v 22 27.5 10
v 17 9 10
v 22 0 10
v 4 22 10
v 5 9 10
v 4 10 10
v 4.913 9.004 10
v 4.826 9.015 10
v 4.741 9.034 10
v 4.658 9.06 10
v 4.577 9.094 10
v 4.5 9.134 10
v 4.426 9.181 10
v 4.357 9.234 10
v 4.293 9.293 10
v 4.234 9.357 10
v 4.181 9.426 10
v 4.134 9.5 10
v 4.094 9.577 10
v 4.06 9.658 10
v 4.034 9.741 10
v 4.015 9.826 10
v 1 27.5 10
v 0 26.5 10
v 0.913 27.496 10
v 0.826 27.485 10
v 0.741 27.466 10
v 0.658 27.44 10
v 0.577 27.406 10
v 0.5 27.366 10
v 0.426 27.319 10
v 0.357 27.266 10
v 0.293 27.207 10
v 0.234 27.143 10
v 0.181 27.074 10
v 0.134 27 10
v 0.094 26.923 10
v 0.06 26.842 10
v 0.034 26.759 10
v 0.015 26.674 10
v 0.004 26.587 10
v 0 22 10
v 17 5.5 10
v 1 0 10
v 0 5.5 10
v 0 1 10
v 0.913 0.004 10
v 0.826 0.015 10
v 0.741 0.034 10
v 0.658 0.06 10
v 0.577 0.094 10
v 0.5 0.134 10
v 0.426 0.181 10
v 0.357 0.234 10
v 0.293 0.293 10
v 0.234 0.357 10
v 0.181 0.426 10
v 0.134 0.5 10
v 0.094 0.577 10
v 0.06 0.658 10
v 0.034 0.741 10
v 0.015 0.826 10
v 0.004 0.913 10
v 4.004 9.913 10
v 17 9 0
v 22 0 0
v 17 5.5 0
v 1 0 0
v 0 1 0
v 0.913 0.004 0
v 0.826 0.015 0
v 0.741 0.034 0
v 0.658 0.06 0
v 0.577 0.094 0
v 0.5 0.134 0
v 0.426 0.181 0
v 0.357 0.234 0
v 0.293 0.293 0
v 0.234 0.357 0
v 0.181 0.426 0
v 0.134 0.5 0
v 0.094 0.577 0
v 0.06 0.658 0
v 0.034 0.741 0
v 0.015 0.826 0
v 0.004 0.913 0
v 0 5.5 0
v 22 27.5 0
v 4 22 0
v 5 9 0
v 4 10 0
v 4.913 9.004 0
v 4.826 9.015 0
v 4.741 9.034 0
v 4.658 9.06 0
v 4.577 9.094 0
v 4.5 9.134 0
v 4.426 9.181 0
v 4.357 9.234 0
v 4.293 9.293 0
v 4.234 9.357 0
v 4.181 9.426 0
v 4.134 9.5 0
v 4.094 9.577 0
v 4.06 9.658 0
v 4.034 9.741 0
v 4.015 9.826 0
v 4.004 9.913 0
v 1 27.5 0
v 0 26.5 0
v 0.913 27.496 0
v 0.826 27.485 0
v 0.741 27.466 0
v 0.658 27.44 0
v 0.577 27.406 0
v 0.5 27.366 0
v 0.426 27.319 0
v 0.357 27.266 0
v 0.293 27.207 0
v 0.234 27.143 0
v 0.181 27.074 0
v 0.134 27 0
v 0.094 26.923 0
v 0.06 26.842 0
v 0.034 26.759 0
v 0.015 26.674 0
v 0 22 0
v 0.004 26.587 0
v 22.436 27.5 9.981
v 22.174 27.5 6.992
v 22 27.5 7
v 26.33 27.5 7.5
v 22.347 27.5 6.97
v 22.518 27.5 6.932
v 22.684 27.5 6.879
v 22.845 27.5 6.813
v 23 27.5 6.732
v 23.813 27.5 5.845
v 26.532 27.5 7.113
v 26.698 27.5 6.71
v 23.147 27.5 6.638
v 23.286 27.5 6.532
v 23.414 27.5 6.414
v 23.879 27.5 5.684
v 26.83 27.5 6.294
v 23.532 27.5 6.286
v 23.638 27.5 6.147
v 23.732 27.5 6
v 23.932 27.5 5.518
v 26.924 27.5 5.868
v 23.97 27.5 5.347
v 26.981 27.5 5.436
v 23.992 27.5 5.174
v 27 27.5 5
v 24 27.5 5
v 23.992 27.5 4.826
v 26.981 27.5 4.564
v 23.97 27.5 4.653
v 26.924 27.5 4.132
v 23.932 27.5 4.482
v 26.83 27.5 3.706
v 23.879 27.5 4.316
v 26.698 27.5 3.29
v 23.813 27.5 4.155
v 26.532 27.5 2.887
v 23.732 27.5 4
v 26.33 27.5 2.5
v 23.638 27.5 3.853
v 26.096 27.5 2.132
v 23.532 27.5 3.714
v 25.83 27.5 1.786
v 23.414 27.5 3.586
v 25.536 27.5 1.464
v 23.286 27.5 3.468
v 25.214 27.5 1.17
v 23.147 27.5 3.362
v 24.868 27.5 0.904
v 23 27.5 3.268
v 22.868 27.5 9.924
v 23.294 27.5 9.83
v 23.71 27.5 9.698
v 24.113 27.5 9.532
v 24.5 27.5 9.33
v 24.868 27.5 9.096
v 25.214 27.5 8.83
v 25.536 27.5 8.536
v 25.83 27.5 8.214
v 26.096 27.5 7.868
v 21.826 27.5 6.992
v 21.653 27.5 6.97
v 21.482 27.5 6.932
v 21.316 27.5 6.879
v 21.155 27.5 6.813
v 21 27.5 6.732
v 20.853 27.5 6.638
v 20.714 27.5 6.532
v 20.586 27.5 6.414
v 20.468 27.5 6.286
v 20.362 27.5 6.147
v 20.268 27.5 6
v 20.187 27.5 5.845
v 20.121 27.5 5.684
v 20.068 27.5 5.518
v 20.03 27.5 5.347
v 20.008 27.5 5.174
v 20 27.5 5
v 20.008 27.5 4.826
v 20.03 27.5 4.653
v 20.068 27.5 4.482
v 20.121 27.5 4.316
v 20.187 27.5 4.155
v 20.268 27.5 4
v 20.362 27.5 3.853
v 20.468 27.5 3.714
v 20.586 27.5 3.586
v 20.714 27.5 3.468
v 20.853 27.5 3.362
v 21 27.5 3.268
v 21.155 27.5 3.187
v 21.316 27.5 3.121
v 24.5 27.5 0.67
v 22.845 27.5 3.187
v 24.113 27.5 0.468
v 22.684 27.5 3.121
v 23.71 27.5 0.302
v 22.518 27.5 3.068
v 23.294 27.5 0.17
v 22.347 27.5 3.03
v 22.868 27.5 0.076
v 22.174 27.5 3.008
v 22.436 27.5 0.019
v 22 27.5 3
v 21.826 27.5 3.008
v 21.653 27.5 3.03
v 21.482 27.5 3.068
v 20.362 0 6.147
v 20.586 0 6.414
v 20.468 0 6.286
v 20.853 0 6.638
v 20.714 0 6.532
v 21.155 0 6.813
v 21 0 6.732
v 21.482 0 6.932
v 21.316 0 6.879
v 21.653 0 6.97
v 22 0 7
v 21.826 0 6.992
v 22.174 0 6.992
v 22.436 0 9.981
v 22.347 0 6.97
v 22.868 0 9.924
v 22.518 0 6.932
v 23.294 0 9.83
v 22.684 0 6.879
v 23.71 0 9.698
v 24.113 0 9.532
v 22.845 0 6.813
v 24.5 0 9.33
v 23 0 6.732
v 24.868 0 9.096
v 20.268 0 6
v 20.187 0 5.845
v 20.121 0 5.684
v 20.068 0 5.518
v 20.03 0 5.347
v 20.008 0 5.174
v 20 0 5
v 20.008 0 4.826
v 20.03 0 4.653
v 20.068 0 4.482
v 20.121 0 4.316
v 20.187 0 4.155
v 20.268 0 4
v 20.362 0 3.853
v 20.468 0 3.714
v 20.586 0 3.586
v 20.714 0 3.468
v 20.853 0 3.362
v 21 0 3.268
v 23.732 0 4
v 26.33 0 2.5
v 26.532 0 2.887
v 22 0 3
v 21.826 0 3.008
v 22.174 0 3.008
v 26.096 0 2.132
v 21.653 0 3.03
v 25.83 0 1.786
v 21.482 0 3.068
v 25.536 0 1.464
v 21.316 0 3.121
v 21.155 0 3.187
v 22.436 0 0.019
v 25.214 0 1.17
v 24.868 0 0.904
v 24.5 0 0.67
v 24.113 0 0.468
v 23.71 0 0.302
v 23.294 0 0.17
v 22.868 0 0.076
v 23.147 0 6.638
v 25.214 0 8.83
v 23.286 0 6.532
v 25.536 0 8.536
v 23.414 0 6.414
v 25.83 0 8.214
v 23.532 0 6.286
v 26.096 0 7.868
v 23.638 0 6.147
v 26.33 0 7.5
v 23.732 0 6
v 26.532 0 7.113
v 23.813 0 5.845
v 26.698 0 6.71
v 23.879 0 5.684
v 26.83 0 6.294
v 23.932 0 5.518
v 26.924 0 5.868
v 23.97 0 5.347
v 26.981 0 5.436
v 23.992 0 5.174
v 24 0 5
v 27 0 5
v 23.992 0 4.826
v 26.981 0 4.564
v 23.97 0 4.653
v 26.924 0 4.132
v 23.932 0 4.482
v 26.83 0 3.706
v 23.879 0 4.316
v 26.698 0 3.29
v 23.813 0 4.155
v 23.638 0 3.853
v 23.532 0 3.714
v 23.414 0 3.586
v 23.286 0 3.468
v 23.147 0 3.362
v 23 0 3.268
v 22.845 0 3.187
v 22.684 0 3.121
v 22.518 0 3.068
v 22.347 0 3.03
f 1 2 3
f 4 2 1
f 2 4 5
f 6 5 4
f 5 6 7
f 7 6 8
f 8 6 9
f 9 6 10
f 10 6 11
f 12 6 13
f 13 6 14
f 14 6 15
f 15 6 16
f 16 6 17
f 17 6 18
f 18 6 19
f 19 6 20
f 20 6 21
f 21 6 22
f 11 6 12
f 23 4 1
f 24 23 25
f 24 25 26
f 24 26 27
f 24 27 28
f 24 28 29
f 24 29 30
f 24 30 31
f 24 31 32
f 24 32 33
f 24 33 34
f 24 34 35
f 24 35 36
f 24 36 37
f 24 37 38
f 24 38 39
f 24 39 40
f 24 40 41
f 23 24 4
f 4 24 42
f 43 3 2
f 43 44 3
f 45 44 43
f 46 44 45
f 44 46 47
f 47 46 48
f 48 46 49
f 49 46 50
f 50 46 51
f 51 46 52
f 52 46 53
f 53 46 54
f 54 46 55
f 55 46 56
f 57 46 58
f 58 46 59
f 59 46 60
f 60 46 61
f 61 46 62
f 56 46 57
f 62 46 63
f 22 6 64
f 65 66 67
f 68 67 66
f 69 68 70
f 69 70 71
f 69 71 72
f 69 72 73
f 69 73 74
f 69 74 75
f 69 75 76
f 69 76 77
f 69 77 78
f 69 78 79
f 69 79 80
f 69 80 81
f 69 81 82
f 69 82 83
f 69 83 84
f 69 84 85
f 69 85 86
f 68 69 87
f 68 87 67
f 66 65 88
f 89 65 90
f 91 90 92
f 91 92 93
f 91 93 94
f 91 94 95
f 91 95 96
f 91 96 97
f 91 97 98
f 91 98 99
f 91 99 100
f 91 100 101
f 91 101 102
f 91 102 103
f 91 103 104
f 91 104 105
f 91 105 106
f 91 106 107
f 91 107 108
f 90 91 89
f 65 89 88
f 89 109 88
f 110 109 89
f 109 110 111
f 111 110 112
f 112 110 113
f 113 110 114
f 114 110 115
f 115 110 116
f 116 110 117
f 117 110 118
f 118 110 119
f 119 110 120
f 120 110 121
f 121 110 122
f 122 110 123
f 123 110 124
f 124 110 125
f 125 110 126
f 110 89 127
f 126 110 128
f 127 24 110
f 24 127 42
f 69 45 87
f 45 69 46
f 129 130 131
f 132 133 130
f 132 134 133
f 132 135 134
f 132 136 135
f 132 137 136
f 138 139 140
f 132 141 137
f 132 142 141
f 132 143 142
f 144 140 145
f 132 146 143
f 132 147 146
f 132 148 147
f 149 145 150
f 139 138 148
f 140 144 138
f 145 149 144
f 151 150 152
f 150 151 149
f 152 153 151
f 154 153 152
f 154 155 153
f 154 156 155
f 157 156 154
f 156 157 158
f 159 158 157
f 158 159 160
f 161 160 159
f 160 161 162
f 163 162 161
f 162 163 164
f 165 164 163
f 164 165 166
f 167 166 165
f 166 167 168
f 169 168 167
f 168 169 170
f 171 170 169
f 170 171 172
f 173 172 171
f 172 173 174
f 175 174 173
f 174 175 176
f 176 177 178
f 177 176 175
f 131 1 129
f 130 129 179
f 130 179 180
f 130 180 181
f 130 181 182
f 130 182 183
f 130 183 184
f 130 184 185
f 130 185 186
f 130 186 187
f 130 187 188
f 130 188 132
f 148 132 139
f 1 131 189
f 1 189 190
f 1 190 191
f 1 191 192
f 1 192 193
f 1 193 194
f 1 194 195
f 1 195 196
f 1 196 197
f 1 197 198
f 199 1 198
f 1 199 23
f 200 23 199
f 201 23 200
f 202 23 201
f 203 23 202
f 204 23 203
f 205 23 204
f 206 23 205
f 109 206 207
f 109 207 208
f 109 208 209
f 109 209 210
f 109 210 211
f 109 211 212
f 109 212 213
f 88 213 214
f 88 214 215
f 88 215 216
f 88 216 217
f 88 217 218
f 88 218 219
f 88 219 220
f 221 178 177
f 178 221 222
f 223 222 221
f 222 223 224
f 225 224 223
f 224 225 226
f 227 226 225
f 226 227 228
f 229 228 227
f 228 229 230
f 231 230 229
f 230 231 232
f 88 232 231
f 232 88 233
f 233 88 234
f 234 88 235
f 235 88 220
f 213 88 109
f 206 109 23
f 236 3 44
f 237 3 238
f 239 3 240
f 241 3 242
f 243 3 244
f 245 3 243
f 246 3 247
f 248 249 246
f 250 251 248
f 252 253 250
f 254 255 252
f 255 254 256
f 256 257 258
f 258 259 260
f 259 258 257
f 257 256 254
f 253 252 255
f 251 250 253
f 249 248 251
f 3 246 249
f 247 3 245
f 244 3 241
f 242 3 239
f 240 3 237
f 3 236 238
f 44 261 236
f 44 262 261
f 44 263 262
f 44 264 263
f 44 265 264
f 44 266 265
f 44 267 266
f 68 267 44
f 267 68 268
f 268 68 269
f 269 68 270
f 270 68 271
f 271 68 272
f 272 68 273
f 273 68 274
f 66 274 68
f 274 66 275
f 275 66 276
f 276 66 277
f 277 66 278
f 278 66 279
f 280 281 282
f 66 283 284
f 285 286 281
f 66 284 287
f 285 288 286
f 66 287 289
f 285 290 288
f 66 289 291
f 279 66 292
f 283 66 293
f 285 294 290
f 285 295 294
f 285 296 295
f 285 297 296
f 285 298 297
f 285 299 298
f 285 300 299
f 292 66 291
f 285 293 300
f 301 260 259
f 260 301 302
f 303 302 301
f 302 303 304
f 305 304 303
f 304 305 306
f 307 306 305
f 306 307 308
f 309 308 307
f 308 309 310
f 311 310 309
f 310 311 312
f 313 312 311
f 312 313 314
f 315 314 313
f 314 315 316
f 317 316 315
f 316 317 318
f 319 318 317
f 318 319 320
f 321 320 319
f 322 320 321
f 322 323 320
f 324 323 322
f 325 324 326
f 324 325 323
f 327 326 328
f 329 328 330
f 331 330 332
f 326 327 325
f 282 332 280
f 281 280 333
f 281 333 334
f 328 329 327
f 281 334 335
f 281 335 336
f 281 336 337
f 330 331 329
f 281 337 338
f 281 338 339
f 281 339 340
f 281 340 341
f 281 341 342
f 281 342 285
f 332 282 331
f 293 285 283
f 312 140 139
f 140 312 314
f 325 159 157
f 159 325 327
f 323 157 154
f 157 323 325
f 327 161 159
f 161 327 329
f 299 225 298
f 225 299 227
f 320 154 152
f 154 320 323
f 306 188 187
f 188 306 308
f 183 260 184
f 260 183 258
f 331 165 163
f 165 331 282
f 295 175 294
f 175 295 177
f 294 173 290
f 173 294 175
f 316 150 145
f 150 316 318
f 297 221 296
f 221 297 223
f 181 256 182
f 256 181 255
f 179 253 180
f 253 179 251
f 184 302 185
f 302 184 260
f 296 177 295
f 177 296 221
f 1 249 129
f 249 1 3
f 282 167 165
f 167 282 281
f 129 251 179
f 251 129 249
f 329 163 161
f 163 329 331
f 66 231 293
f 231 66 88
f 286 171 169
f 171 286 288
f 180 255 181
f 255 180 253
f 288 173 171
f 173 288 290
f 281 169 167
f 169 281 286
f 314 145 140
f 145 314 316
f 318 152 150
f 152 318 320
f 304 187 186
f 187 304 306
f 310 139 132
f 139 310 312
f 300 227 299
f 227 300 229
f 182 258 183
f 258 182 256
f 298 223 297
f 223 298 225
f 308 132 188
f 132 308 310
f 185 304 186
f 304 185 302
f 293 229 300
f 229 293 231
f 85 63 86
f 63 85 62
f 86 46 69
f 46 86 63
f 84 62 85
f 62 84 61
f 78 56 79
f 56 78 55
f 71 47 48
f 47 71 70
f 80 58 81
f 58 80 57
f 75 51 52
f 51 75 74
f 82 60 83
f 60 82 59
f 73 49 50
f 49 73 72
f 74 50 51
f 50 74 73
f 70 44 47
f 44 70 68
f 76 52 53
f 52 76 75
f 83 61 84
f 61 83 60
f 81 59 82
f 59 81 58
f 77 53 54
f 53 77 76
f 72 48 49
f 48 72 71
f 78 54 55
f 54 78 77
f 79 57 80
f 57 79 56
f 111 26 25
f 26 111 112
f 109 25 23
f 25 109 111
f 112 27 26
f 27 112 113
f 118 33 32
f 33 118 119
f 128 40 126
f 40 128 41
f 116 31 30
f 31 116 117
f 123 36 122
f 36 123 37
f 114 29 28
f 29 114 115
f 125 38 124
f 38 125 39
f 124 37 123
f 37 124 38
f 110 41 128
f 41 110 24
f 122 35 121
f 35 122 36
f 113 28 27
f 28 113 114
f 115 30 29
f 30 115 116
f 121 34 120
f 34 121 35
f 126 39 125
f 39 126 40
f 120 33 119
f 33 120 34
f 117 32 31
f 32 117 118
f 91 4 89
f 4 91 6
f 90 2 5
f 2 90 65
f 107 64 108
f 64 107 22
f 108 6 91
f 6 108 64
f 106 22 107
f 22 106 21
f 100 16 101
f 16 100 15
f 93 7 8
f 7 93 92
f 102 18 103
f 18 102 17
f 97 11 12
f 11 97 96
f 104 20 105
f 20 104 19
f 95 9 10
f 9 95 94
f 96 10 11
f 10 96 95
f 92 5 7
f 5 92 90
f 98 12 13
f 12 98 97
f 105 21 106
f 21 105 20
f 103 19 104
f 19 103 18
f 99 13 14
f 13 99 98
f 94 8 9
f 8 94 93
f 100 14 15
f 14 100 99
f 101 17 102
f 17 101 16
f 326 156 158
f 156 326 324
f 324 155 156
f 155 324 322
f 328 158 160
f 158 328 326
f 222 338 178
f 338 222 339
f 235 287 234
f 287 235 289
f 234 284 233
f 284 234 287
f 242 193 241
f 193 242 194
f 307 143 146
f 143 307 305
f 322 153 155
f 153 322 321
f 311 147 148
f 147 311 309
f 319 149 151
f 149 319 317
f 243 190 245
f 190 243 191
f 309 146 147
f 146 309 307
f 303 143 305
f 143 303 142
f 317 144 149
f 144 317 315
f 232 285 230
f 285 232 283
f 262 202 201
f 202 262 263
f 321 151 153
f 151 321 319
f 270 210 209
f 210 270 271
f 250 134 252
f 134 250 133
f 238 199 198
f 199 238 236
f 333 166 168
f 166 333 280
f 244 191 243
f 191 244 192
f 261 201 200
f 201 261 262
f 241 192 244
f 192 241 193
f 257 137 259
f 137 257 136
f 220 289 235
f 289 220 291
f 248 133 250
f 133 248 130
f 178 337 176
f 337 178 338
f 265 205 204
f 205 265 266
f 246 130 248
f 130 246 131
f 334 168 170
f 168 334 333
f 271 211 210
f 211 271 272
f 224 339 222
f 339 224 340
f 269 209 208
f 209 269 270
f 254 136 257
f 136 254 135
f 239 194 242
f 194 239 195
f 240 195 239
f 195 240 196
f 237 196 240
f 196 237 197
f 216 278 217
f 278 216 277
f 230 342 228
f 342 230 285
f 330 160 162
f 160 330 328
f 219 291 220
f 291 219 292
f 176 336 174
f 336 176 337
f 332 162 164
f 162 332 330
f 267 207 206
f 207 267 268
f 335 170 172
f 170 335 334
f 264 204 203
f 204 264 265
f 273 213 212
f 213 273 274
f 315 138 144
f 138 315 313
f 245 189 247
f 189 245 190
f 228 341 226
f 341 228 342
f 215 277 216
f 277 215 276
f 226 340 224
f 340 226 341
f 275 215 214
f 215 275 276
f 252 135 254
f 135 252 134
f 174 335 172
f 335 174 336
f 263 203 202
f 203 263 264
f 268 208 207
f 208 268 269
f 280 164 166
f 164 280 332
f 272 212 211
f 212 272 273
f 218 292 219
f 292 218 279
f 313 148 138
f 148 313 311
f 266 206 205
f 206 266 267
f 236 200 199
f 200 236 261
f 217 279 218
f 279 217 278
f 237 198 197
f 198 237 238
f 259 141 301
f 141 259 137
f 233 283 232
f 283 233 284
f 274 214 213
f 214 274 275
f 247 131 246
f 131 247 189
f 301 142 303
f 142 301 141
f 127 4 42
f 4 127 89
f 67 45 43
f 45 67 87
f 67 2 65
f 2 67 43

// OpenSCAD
ScrewOffset = 22;
BlockWidth = 27.5;
BlockThickness = 10;

CutWidth = 16.5;
CutDepth = 3.5;
Padding = 0.5;
$fn = 72;

difference() {
    union () {
        cube([ScrewOffset, BlockWidth, BlockThickness]);
        translate([ScrewOffset, 0,BlockThickness/2])
            rotate([-90,0,0])
                cylinder(r=BlockThickness/2, h=BlockWidth);

    }
    
    union() {
        translate([ScrewOffset, 0,BlockThickness/2])
            rotate([-90,0,0])
                translate([0,0,-1])
                    cylinder(r=2,h=BlockWidth+2);
        
        translate([-1,(BlockWidth-CutWidth)/2,-1])
        cube([CutDepth+Padding+1, CutWidth, BlockThickness+2]);    
    
        translate([-1,(BlockWidth-CutWidth)/2,-1])
        cube([CutWidth+Padding+1, CutDepth, BlockThickness+2]);      

        translate([0,0,-1])
            rotate([0,0,180])
                Corner(1, BlockThickness+2);
        
        translate([0,BlockWidth,-1])    
            rotate([0,0,90])
                Corner(1, BlockThickness+2);
        
        translate([CutDepth+Padding,(BlockWidth-CutWidth)/2+CutDepth,-1])    
            rotate([0,0,180])
                Corner(1, BlockThickness+2);
    }
}


module Corner(radius, length) {
    translate([-radius,-radius,0])
        difference() {
                cube([radius, radius, length]);
            translate([0,0,-1])
            cylinder(r=radius,h=length+2);
        }  
}
